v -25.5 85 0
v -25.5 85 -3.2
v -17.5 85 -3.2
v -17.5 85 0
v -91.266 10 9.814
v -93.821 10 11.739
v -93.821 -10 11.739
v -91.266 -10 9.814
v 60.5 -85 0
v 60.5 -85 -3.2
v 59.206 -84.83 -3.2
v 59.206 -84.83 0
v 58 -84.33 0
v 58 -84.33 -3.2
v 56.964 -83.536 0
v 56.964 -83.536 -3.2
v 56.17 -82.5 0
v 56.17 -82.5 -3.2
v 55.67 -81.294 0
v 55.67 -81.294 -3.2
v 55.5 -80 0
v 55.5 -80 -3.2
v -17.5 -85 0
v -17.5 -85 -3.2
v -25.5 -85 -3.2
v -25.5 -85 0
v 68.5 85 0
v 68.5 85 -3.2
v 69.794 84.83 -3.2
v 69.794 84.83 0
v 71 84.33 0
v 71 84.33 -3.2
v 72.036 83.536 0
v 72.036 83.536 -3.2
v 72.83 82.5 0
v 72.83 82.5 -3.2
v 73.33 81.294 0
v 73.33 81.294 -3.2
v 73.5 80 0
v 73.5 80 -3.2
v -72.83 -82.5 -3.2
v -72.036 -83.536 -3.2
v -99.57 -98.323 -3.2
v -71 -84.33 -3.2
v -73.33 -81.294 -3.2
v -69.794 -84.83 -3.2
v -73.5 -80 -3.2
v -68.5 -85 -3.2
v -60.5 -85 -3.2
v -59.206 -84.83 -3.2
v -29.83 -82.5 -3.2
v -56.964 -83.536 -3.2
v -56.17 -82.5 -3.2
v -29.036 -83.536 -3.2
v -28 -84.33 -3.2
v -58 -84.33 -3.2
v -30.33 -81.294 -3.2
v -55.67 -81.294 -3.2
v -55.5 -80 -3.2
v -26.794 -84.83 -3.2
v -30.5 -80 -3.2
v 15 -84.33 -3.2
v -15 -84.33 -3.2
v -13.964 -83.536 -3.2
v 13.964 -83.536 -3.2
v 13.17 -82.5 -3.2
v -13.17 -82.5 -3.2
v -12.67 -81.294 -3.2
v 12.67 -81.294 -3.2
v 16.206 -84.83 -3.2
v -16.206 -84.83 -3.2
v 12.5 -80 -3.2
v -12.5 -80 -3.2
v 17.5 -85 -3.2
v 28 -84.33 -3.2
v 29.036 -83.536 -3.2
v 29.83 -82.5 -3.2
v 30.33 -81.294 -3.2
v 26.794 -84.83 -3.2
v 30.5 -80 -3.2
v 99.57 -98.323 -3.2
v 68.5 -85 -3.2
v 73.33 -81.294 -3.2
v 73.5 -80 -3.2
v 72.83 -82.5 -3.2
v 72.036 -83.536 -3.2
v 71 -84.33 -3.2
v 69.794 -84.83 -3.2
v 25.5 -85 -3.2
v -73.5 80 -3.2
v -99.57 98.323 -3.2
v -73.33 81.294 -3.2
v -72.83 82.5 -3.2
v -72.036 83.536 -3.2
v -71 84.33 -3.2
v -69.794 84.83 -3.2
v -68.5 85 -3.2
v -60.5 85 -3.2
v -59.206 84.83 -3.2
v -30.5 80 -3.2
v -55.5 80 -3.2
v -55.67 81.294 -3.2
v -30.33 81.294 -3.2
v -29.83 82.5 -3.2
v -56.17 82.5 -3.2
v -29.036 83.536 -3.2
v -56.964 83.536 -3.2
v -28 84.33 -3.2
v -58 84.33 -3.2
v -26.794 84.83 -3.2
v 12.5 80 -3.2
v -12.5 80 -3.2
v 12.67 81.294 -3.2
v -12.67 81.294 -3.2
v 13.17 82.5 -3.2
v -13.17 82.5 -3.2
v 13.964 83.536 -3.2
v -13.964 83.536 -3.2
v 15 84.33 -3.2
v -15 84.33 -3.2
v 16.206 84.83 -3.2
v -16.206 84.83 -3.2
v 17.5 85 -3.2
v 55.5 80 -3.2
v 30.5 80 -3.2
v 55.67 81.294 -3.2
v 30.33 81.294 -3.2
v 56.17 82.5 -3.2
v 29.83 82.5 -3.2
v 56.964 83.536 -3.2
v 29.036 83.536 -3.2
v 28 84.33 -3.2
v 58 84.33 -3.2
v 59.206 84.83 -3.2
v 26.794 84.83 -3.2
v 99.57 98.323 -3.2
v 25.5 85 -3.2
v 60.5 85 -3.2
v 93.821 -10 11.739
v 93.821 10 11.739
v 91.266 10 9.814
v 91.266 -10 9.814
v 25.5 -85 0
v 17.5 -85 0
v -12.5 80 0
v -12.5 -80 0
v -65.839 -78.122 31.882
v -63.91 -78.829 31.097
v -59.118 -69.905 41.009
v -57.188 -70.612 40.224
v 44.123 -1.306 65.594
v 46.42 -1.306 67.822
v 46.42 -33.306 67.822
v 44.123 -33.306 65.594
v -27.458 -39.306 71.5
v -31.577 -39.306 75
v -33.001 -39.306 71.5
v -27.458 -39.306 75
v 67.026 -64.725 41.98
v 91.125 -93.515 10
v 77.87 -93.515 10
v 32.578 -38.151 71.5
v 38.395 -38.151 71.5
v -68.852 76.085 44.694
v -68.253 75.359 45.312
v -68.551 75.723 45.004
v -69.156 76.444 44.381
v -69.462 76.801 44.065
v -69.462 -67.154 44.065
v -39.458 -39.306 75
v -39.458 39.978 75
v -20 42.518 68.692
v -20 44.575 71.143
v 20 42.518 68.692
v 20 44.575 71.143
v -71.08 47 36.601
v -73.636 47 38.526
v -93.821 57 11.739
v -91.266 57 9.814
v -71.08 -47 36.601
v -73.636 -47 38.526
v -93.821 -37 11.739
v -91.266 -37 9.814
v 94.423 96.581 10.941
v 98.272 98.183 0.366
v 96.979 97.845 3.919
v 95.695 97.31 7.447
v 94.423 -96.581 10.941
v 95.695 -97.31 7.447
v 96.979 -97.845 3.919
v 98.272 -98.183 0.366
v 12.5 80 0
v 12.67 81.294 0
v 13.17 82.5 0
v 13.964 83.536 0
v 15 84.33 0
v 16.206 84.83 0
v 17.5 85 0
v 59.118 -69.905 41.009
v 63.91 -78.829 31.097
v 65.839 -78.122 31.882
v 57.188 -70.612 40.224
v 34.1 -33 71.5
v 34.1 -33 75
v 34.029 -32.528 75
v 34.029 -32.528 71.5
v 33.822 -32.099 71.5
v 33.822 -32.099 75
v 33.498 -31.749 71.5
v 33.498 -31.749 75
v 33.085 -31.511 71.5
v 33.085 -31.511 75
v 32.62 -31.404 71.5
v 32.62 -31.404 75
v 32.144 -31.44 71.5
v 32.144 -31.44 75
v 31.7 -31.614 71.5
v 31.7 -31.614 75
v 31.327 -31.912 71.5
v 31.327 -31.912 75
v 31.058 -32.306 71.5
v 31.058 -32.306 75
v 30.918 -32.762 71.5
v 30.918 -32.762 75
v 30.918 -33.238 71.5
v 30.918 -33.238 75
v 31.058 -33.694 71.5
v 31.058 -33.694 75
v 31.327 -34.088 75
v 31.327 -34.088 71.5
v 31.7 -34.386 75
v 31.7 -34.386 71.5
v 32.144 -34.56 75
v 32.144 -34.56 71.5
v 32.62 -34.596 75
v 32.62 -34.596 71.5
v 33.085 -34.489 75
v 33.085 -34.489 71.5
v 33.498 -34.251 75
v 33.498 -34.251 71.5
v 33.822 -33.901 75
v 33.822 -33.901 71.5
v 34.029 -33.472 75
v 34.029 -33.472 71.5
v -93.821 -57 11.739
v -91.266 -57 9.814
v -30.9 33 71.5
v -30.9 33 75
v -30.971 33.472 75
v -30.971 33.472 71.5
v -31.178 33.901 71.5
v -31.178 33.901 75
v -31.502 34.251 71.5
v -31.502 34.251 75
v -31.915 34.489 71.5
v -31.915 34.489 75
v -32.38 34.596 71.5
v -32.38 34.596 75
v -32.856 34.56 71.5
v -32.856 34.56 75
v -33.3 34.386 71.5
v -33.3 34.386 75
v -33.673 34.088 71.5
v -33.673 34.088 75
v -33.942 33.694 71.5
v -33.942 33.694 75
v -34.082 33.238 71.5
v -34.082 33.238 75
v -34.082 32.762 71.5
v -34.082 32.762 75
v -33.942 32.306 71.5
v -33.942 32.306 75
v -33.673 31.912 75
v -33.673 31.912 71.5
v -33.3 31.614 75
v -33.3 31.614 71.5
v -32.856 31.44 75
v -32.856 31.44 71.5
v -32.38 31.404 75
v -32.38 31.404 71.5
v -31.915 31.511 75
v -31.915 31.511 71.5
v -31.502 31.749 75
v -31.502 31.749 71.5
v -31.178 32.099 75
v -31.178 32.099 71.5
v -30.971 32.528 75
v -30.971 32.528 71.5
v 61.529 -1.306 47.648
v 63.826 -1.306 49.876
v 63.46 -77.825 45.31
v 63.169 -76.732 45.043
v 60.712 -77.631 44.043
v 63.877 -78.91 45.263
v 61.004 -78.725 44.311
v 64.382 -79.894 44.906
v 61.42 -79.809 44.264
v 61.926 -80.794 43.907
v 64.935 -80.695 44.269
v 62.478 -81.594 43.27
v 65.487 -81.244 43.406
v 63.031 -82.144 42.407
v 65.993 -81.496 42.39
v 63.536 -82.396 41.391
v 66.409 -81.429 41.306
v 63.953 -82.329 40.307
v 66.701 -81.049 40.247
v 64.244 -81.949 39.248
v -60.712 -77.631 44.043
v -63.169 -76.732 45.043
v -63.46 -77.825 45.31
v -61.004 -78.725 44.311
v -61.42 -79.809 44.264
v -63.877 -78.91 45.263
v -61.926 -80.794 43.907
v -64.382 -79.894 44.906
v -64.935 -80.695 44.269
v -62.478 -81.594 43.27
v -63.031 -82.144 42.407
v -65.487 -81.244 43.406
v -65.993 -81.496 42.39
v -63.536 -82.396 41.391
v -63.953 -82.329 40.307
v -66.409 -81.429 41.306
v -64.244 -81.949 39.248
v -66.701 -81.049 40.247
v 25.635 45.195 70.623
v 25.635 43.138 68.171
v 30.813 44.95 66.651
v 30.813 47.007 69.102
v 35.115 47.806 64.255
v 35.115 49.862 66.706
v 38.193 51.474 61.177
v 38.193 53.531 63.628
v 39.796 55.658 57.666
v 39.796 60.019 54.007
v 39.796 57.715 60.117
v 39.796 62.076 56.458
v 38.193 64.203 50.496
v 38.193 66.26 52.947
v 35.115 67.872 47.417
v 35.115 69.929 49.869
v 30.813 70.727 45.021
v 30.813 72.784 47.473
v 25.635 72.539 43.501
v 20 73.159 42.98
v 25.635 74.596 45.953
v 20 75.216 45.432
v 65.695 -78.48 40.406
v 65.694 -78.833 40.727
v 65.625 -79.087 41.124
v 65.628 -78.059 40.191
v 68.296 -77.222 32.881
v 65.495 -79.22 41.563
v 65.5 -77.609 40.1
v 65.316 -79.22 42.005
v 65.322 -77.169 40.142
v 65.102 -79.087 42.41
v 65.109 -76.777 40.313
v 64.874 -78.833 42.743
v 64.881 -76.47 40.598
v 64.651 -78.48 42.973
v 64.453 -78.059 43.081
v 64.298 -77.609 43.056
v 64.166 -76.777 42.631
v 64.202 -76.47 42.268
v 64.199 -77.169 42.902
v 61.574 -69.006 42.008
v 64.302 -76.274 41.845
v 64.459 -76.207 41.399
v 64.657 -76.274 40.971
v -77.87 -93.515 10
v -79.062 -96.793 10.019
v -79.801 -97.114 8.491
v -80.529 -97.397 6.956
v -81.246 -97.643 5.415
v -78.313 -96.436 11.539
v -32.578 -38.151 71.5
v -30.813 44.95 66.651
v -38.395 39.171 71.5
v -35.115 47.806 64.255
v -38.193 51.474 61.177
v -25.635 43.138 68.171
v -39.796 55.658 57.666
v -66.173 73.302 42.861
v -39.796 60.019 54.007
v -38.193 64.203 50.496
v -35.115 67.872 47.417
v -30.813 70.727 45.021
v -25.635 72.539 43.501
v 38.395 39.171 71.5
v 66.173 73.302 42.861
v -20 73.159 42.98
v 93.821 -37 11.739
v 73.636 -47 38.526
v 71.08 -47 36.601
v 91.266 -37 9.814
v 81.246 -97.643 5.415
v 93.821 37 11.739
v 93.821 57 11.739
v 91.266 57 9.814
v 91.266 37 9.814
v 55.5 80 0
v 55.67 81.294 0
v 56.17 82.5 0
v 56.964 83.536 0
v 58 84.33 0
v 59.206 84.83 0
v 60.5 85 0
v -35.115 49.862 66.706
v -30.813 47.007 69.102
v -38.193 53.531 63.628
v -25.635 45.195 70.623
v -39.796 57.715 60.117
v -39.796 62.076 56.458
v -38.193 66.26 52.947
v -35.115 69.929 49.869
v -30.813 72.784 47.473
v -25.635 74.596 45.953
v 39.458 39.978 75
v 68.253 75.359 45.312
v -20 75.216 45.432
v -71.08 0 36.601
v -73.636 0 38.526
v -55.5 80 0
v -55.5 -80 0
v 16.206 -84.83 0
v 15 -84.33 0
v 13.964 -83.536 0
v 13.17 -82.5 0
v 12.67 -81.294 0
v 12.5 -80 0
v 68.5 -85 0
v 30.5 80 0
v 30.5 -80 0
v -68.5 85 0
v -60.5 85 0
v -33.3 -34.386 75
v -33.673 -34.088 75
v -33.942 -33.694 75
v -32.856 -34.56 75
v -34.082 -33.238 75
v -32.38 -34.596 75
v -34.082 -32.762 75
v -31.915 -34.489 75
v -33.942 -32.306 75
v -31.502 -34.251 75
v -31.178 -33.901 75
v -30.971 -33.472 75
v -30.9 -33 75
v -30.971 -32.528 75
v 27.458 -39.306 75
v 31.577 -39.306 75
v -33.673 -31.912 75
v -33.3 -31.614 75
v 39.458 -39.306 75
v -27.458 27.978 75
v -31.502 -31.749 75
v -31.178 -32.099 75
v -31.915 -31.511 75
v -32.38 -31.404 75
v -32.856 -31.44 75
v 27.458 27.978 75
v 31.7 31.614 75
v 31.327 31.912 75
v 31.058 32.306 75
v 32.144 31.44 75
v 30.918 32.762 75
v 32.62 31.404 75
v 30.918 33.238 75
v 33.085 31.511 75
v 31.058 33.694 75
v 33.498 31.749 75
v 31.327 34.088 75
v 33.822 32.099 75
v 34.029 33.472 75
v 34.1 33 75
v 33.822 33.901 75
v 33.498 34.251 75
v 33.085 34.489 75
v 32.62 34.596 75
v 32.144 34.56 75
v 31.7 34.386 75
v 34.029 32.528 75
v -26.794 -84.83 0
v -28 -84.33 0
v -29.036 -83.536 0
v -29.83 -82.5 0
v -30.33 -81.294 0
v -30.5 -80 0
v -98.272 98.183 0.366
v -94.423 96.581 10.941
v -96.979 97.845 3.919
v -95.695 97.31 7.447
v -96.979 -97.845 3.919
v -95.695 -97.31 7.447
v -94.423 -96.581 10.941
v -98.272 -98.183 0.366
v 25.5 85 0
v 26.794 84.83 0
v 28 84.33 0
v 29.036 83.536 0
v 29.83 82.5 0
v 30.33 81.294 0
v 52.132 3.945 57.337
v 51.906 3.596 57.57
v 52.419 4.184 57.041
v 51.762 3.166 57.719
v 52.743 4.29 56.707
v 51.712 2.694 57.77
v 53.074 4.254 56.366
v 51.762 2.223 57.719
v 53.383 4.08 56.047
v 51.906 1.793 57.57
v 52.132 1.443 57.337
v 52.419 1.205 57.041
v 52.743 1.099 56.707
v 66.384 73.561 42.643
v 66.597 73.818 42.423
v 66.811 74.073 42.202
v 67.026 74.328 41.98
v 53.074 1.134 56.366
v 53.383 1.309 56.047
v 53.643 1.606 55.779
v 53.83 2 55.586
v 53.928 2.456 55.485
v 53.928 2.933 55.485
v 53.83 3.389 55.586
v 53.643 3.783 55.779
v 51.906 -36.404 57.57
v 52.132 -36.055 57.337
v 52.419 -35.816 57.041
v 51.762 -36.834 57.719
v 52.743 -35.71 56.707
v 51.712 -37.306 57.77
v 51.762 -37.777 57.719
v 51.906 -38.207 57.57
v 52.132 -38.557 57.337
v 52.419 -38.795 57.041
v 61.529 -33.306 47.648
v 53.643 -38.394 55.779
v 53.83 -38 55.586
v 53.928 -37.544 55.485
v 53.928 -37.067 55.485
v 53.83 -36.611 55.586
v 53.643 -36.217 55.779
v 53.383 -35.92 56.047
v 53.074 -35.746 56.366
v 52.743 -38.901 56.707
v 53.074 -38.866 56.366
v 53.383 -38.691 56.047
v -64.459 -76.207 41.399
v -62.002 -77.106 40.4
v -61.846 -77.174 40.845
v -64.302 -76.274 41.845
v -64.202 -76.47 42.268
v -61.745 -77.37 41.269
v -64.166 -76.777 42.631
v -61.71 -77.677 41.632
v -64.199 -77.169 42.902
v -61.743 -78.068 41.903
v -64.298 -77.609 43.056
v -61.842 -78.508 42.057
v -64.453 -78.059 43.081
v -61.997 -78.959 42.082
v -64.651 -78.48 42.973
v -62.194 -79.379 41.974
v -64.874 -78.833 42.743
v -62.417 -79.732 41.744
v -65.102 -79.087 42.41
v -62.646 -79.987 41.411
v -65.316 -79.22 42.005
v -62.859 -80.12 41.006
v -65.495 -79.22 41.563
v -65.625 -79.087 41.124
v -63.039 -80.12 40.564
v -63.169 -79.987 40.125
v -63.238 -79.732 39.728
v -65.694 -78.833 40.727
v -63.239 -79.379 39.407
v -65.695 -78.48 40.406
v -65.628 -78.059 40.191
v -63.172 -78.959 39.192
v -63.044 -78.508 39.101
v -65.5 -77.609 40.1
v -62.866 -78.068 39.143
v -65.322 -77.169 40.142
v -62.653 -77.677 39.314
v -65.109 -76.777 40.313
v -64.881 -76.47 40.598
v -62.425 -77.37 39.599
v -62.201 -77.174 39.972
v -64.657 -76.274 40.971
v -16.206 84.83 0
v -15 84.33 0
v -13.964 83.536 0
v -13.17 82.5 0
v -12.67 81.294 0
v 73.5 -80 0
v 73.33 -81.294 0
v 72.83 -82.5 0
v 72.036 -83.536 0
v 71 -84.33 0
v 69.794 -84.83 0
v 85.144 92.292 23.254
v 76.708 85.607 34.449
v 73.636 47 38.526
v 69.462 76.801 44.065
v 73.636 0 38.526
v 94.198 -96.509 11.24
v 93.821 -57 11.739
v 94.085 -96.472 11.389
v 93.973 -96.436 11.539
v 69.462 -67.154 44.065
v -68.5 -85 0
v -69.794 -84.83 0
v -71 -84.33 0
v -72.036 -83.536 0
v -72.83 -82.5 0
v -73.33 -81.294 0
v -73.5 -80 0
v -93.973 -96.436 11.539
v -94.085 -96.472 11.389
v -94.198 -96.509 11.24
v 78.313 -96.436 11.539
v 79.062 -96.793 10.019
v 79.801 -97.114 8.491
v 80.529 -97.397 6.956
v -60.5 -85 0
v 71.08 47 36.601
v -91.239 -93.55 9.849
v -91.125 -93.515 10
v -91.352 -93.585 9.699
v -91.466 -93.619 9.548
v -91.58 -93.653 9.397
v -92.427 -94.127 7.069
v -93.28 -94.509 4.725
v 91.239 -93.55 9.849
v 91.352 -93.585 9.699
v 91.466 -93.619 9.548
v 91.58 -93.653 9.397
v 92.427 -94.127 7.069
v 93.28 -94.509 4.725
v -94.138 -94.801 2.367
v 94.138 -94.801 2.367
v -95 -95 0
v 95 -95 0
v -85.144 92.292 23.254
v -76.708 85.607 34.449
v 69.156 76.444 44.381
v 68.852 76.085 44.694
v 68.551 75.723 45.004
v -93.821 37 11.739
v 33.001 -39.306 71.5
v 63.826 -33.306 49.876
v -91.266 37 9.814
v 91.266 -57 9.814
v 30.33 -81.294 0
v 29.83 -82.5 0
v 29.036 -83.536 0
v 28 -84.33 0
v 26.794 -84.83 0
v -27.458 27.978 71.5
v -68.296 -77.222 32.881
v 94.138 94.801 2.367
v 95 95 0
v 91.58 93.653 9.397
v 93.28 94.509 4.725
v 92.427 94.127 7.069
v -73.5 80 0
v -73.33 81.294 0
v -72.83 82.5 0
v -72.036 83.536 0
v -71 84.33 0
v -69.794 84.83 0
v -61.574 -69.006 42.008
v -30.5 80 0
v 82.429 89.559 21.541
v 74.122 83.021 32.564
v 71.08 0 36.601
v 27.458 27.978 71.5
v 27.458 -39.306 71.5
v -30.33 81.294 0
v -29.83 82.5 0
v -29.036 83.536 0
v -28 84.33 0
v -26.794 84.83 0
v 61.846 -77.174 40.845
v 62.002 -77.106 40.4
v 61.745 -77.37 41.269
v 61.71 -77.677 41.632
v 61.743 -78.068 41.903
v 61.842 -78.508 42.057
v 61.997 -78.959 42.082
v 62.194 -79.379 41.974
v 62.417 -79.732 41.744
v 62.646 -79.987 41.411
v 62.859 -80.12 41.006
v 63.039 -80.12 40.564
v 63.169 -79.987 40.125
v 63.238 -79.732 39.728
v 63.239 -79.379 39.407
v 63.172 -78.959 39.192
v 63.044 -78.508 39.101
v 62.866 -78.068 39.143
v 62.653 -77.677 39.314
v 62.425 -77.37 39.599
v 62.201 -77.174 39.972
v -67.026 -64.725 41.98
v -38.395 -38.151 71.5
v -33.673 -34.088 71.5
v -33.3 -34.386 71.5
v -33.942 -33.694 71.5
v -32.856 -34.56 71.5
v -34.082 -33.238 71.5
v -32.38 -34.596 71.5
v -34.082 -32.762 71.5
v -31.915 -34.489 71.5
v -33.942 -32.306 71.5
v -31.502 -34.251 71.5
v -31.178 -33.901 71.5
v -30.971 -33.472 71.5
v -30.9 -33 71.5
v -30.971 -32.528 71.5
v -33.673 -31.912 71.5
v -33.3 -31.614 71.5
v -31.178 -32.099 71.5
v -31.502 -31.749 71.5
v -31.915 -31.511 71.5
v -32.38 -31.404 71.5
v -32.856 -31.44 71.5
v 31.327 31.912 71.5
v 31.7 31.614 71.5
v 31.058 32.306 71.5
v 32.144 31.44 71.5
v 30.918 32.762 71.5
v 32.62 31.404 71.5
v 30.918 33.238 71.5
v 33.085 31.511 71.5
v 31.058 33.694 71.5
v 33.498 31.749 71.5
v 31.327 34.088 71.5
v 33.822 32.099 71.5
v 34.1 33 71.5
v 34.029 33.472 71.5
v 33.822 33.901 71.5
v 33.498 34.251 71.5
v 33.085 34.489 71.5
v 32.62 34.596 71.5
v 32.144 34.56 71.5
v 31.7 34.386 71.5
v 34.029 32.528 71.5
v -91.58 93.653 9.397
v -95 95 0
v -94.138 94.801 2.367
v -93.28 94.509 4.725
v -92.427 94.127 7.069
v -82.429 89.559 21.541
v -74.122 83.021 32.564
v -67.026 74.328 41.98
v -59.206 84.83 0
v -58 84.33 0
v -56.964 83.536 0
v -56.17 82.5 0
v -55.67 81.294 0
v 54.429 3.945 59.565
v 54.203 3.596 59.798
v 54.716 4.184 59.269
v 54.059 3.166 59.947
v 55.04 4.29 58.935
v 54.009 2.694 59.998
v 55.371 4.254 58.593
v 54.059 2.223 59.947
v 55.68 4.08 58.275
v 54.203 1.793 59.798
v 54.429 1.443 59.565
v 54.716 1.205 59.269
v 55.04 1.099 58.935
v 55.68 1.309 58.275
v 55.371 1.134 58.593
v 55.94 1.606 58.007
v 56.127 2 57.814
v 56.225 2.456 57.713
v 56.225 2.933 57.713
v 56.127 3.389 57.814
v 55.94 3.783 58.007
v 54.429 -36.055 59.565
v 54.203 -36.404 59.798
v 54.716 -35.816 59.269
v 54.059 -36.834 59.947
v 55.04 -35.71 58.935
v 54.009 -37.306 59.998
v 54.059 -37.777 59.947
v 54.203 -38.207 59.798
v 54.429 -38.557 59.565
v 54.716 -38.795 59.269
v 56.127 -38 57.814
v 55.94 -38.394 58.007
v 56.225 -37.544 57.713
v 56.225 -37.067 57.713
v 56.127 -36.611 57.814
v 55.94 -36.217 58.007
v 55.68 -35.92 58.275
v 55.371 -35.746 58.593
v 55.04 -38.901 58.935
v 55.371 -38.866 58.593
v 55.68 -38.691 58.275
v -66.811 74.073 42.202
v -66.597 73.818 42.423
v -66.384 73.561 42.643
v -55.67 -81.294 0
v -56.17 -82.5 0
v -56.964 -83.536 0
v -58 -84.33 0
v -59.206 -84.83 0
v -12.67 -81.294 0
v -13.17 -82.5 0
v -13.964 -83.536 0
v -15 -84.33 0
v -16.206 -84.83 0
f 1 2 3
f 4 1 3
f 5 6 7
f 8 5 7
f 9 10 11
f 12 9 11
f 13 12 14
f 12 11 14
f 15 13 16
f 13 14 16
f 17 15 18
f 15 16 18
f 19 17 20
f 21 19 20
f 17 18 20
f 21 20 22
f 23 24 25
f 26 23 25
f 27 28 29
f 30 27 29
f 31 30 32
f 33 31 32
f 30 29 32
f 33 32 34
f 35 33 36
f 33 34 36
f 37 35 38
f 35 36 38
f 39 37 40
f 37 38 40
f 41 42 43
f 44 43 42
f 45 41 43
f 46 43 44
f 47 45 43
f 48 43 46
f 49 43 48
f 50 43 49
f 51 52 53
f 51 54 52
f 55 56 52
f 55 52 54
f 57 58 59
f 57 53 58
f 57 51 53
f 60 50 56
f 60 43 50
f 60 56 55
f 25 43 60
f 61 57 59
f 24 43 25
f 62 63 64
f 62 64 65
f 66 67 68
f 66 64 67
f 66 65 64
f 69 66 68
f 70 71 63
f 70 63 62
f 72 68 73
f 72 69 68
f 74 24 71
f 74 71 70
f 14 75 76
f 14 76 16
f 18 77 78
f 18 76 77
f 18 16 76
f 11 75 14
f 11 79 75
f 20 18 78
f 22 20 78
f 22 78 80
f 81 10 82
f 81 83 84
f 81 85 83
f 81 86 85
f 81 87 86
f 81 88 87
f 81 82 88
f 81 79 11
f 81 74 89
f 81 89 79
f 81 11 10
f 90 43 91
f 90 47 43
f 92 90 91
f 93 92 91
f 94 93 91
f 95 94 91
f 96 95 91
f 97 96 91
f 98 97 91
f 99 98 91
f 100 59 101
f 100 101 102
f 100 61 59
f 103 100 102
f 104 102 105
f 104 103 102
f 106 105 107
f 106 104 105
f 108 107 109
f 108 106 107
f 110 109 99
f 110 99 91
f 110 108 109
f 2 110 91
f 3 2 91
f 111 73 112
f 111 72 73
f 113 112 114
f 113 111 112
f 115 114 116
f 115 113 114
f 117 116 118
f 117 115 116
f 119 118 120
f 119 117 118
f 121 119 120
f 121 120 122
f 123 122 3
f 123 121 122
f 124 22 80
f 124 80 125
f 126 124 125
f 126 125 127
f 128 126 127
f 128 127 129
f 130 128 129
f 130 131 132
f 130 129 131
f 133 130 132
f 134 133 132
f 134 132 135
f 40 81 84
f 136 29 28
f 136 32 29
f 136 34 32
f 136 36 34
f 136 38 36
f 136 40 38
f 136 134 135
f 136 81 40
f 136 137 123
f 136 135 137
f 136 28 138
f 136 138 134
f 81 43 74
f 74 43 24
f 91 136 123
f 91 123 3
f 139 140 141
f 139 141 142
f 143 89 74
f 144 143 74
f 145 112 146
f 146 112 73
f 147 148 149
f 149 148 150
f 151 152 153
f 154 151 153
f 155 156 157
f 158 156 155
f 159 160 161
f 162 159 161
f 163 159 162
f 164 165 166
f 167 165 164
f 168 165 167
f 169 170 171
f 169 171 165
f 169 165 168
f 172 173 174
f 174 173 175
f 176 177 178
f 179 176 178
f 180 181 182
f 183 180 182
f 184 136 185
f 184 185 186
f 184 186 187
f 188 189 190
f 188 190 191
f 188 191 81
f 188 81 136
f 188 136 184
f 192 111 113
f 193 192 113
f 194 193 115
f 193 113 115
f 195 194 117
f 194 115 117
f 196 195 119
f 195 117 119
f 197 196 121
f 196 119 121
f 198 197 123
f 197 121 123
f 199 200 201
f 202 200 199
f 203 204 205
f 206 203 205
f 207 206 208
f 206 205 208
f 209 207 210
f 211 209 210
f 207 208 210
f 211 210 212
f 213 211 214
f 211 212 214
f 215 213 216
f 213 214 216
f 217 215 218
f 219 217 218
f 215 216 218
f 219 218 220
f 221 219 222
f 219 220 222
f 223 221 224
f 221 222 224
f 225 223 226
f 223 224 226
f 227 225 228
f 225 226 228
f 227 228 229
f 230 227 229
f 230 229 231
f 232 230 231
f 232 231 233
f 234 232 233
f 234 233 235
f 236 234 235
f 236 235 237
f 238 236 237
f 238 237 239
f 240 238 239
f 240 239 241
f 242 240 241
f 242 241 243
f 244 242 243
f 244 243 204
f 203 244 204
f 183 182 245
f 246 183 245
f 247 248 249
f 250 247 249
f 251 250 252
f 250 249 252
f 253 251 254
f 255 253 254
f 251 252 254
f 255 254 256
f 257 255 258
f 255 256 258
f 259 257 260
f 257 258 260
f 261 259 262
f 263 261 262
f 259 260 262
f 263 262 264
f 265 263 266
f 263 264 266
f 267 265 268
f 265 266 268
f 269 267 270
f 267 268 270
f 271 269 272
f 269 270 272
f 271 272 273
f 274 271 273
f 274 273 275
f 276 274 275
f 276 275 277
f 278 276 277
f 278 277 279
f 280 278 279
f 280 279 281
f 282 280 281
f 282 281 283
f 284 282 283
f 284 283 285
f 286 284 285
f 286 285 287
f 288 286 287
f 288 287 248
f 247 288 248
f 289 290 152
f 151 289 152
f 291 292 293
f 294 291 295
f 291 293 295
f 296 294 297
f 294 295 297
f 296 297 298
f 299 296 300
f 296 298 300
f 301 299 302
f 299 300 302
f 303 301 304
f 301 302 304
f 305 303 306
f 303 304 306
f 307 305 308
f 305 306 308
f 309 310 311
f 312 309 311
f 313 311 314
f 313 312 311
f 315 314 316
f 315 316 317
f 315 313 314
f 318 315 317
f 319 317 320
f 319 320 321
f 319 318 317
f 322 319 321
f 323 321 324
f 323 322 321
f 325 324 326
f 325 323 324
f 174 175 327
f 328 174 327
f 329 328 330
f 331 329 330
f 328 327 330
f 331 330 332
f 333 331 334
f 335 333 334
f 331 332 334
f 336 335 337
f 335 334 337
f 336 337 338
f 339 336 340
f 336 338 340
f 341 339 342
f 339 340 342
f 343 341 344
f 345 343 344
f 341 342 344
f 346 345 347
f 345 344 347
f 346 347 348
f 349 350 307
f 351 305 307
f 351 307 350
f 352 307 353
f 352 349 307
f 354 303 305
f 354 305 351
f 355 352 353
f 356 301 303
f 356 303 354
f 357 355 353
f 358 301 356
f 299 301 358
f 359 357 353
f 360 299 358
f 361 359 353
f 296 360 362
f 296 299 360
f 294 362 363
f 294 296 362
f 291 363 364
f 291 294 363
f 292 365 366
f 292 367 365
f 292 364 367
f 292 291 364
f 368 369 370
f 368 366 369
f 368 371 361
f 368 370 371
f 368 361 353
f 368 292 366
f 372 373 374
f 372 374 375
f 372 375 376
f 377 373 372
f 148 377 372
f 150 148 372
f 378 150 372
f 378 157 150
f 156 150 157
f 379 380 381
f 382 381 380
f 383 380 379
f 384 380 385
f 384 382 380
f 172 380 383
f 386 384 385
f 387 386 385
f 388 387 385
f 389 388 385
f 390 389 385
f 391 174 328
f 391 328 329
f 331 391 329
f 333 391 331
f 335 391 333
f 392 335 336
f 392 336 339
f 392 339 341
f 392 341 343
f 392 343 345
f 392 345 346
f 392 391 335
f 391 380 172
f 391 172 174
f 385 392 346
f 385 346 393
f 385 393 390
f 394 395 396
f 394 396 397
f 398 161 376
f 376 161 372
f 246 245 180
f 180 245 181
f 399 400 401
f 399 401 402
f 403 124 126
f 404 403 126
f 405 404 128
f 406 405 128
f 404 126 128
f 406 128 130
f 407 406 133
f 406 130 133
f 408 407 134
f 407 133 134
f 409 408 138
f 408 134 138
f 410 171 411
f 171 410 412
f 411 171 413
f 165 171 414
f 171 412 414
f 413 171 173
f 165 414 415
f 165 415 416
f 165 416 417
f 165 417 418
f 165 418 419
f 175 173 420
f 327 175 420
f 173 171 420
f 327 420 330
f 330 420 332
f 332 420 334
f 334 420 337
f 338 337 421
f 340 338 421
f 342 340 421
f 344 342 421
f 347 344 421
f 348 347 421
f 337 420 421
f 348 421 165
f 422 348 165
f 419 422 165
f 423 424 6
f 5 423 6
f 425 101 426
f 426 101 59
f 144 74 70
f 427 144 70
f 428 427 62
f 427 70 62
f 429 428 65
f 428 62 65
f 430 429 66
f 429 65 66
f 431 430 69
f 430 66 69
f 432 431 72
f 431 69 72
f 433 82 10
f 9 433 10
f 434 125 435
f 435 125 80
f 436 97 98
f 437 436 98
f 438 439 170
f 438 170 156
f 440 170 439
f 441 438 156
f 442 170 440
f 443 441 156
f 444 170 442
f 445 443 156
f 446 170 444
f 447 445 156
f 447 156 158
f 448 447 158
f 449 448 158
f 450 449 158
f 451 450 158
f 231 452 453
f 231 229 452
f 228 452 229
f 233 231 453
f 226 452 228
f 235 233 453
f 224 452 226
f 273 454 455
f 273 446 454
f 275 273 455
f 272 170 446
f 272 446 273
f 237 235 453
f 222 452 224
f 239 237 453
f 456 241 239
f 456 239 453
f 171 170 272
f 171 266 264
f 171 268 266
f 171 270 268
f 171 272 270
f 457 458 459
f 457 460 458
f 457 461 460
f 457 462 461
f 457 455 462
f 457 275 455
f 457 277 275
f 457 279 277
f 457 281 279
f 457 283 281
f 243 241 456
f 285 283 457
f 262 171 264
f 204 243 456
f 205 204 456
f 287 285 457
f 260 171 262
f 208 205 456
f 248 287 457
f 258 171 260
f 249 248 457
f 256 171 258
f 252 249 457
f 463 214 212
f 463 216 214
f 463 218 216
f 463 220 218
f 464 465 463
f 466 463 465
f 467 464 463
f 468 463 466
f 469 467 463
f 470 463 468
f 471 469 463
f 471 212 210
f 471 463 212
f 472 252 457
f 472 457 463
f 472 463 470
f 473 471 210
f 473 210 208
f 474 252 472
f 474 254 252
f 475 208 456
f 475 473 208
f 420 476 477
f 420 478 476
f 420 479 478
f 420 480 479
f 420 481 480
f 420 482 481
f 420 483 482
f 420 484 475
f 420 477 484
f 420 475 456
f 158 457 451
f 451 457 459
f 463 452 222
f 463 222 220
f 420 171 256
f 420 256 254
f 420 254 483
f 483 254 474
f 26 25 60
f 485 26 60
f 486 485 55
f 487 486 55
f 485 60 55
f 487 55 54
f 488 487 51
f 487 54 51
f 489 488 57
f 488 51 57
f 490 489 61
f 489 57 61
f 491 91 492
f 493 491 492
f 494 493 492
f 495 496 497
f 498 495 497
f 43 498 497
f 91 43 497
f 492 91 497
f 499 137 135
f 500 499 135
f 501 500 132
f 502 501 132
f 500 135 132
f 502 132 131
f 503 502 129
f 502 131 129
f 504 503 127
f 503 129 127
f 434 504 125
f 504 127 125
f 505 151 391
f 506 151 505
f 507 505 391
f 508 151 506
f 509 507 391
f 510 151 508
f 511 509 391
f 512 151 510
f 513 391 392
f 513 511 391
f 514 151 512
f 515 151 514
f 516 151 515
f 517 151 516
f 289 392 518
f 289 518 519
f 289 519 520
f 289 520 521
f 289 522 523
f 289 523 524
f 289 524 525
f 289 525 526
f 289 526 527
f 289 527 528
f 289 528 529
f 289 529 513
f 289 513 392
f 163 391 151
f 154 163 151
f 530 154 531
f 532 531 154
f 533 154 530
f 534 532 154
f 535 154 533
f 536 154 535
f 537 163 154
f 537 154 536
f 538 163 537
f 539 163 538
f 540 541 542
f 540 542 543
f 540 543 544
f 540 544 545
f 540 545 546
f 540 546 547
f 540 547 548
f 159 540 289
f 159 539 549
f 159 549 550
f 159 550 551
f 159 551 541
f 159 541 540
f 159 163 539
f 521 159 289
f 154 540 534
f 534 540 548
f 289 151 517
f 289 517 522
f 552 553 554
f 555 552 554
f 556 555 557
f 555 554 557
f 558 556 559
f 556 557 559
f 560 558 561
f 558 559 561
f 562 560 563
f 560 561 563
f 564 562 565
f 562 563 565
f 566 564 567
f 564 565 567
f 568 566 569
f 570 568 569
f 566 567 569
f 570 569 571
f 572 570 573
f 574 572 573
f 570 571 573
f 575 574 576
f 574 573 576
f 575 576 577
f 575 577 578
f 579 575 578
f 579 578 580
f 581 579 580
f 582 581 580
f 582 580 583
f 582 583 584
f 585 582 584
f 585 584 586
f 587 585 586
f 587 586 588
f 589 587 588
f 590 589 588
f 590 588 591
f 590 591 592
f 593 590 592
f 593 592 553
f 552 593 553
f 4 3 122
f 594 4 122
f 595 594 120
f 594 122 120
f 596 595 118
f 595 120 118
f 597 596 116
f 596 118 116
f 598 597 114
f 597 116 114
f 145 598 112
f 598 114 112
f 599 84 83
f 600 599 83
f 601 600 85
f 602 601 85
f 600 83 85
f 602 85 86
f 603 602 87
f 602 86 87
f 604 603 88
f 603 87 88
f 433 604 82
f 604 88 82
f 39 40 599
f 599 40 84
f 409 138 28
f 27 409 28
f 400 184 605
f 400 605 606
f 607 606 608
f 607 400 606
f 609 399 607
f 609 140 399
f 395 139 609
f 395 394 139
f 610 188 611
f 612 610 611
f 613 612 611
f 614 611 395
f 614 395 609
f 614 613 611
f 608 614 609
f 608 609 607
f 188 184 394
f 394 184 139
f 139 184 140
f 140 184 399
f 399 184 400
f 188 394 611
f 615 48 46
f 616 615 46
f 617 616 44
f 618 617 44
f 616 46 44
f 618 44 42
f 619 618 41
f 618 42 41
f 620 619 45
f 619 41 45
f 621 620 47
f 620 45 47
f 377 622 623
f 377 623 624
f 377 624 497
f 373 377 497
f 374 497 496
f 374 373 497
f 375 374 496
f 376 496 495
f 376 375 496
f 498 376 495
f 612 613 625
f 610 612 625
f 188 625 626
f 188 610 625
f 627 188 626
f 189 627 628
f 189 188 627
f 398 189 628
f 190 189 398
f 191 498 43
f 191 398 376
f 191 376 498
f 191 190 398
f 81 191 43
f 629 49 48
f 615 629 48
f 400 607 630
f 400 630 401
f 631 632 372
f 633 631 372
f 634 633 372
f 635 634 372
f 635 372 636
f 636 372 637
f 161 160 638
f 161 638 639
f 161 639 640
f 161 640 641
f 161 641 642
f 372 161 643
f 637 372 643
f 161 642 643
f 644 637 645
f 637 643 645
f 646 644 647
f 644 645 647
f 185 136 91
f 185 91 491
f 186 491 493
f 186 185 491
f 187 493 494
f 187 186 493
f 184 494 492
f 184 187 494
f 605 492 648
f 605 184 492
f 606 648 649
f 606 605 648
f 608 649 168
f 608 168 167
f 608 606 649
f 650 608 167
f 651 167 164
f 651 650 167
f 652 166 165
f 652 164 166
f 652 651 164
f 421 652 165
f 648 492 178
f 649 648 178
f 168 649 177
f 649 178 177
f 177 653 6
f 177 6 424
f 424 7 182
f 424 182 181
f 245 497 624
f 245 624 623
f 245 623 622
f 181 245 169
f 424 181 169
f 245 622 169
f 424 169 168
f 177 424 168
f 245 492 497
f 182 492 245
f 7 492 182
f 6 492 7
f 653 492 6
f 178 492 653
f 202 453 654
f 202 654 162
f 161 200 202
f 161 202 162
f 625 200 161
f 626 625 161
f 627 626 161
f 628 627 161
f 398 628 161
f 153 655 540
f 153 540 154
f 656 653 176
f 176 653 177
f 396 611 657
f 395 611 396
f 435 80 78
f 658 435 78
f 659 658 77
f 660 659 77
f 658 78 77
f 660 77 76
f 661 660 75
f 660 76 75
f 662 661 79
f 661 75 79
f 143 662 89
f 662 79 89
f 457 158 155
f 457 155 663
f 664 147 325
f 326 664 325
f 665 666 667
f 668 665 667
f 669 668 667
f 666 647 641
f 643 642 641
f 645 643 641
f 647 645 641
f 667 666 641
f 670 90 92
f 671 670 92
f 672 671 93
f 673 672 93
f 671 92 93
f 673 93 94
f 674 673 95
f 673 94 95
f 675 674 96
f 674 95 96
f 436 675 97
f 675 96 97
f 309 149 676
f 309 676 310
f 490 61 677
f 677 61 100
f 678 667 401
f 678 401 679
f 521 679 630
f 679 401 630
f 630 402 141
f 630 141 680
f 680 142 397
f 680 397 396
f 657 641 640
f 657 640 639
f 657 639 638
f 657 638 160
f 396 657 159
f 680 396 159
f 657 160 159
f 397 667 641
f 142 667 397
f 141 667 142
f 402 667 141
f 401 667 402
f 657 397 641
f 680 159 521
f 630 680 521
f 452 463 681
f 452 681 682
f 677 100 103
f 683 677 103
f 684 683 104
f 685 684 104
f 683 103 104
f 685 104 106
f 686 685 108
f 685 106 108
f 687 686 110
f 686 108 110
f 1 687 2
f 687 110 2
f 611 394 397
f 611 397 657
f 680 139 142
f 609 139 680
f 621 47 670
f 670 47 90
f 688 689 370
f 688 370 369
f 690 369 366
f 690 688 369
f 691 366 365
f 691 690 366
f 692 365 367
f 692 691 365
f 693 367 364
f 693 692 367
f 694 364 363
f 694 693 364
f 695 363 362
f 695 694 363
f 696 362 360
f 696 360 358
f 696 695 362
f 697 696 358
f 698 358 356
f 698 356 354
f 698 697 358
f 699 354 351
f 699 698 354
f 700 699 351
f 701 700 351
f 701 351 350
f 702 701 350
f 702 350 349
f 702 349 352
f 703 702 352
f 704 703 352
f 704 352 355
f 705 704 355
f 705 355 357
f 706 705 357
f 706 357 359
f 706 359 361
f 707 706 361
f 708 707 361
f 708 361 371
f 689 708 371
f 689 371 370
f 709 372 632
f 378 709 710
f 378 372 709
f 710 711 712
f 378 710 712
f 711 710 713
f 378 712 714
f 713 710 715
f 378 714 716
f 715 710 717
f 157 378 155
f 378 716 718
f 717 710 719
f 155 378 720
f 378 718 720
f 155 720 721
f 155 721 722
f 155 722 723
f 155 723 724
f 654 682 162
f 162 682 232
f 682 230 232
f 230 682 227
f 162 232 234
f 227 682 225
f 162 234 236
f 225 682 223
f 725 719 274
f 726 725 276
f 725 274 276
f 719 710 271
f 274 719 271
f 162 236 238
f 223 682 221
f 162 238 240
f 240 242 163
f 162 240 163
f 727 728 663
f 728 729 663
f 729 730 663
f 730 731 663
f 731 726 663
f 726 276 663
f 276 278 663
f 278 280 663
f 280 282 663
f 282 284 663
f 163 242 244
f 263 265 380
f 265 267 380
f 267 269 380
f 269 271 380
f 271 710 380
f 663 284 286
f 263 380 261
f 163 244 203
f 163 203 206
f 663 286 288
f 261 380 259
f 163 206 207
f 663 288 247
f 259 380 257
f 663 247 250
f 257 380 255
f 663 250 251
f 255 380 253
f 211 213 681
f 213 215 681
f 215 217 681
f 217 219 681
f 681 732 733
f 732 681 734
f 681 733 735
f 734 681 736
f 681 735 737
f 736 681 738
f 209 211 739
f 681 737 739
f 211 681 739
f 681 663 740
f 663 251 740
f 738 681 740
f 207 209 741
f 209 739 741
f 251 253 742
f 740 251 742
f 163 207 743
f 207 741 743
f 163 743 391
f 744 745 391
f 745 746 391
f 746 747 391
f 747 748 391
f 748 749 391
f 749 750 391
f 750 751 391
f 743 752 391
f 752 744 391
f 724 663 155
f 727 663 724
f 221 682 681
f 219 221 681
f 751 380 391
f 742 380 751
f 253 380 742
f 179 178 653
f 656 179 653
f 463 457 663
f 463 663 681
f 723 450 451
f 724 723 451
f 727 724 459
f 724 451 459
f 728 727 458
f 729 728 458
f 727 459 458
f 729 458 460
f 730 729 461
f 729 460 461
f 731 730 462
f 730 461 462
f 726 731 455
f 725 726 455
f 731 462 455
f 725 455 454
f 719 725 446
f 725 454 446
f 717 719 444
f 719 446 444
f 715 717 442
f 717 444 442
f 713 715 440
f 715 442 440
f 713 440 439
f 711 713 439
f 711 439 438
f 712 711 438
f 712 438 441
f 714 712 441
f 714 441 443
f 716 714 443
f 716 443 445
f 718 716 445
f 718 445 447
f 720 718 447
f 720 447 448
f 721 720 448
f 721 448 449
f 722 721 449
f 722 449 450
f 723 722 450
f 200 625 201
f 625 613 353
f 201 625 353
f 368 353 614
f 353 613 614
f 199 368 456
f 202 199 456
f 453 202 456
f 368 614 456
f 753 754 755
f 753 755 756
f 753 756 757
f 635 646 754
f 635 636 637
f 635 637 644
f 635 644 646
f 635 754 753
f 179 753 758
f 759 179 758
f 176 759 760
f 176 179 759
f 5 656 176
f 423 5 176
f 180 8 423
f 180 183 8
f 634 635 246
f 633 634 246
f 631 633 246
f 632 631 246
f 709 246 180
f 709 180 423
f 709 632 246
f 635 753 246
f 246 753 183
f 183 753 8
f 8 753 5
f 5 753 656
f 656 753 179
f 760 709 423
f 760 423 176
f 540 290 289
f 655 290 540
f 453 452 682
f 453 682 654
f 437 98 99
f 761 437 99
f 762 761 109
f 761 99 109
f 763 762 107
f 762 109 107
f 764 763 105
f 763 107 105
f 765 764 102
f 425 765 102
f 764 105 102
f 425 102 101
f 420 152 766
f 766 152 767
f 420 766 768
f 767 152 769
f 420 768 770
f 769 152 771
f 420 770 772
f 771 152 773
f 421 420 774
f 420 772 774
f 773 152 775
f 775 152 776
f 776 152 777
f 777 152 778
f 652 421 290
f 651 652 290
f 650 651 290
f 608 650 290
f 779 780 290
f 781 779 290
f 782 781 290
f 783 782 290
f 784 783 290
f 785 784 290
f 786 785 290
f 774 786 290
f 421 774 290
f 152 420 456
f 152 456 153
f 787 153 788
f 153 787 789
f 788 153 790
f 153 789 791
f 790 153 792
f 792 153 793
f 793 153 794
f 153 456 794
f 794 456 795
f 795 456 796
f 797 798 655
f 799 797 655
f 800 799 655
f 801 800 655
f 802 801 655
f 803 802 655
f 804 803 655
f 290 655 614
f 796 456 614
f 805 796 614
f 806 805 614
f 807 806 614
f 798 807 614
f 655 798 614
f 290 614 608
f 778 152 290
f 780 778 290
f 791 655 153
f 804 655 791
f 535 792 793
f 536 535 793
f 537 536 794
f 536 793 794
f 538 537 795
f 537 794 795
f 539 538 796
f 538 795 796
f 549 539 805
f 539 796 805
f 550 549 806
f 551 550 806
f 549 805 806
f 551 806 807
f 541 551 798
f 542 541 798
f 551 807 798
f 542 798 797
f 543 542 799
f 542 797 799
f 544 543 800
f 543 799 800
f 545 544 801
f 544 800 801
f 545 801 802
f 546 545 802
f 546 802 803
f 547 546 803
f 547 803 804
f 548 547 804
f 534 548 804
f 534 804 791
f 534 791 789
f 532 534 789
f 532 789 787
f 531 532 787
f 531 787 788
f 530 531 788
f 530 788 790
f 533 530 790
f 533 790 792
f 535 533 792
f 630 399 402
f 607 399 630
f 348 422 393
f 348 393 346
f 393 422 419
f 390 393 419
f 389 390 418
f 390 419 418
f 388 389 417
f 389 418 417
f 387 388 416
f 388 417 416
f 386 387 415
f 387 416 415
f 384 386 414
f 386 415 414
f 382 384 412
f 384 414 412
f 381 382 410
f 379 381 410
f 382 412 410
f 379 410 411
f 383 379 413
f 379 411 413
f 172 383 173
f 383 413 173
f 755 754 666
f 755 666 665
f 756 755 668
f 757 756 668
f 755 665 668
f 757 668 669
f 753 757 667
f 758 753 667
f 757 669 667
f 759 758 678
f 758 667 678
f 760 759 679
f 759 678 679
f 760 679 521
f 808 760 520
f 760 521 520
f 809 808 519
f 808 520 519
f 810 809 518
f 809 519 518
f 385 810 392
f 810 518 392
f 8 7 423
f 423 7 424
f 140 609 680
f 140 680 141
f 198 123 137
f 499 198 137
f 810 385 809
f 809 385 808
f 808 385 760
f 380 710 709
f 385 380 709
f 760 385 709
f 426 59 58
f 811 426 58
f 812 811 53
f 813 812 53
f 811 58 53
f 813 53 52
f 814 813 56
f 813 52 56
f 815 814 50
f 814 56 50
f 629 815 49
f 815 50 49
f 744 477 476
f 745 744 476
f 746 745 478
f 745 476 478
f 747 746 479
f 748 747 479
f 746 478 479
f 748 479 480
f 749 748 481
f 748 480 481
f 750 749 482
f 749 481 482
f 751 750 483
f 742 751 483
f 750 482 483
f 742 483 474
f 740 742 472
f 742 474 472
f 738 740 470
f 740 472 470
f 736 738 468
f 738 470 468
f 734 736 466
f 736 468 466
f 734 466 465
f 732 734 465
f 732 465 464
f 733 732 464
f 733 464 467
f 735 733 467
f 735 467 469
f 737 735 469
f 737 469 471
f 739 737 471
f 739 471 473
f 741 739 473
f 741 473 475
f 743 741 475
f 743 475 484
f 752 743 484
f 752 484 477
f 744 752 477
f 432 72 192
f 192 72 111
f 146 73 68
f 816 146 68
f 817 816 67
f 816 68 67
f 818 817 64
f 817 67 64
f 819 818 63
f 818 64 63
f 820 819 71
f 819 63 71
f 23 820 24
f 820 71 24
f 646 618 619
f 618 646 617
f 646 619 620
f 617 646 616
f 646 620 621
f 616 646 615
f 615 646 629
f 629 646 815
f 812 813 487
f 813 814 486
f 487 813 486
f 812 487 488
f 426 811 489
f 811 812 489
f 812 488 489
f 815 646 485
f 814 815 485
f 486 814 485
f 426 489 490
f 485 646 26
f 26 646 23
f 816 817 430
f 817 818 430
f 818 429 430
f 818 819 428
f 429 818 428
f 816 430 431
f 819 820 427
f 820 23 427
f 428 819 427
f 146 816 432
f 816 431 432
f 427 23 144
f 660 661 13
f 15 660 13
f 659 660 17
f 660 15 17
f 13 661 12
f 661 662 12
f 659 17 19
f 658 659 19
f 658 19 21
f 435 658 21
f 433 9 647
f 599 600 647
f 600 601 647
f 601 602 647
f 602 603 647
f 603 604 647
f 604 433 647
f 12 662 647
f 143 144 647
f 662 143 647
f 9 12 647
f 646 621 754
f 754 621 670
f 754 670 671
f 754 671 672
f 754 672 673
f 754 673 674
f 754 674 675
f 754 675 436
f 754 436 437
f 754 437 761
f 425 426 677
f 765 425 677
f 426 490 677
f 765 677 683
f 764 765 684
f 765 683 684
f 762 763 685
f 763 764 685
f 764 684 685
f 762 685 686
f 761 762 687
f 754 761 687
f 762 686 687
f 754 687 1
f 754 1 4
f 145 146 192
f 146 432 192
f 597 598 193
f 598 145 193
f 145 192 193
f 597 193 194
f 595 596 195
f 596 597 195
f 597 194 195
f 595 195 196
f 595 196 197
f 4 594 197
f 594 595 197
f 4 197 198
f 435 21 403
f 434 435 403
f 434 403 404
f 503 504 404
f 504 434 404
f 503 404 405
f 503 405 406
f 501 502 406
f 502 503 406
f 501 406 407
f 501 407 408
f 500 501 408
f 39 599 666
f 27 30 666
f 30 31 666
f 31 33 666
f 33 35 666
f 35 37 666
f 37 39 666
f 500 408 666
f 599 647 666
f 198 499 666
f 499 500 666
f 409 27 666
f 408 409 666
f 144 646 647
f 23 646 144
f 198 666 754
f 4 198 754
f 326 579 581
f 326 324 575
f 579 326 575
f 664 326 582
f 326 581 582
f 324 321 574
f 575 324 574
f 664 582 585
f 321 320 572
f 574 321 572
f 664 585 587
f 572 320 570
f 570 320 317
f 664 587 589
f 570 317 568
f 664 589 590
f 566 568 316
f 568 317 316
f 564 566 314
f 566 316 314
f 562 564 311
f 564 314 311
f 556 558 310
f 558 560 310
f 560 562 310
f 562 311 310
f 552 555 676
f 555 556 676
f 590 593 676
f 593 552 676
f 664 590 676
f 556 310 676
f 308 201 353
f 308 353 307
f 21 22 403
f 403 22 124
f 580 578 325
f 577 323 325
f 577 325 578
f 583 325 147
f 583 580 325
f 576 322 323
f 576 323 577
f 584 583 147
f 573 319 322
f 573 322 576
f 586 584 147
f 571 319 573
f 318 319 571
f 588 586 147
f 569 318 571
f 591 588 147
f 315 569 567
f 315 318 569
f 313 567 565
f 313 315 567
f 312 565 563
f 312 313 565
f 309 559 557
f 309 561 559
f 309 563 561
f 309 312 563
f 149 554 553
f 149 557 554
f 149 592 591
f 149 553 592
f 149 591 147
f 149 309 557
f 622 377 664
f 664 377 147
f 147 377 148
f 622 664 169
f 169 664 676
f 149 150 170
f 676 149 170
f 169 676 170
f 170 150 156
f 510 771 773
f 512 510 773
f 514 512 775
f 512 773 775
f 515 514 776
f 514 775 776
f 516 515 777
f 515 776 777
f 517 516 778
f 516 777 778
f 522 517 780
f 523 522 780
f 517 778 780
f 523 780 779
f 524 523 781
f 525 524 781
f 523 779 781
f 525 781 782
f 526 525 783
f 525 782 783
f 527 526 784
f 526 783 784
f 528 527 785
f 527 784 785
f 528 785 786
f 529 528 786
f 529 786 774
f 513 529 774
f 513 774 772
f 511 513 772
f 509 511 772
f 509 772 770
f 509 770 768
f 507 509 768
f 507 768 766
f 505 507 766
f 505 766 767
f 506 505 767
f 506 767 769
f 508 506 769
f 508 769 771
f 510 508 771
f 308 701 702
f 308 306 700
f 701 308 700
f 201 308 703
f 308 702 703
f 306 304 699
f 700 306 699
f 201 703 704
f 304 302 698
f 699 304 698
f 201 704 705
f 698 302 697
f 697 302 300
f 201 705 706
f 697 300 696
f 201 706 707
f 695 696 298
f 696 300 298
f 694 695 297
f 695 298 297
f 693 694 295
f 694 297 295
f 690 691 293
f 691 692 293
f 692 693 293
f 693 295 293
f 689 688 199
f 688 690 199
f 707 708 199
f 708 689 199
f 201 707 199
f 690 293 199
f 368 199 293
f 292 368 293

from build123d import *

# Parameters (mm, degrees)
PAD_DEPTH       = 100
POCKET_DEPTH    = 100
THICKNESS_T     = 3.2
POCKET001_DEPTH = 3.2
SKETCH005_R     = 1.6
SKETCH005_W     = 25
SKETCH005_H     = 32
POCKET002_DEPTH = 5
POCKET003_DEPTH = 5
PAD001_DEPTH    = 3.5
SKETCH008_R     = 1.6
POCKET004_DEPTH = 5
POCKET005_DEPTH = 5
POCKET006_DEPTH = 5
SKETCH011_R     = 1.6
PAD002_DEPTH    = 5
POCKET007_DEPTH = 2.2


with BuildPart() as part:
    # Sketch → Pad (new body, symmetric)
    with BuildSketch(Plane.YZ):
        with BuildLine():
            Line((-95, 0), (95, 0))
            ThreePointArc((95, 0), (88.5403047419, 23.6522969832), (73.3022221559, 42.8606195157))
            Line((35, 75), (73.3022221559, 42.8606195157))
            Line((-35, 75), (35, 75))
            Line((-93.5150551793, 10), (-35, 75))
            ThreePointArc((-93.5150551793, 10), (-94.4647133512, 5.0307659423), (-95, 0))
        make_face()
    extrude(amount=PAD_DEPTH, both=True)

    # Sketch001 → Pocket (cut, symmetric)
    with BuildSketch(Plane.XZ):
        with BuildLine():
            Line((-110, 0), (-110, 75))
            ThreePointArc((110, 75), (0, 106.1145618), (-110, 75))
            Line((110, 75), (110, 0))
            Line((110, 0), (95, 0))
            Line((95, 0), (91.5797985667, 9.3969262079))
            Line((91.5797985667, 9.3969262079), (67.0264978038, 41.980256839))
            Line((35, 75), (67.0264978038, 41.980256839))
            Line((-35, 75), (35, 75))
            Line((-35, 75), (-67.0264978038, 41.980256839))
            Line((-91.5797985667, 9.3969262079), (-67.0264978038, 41.980256839))
            Line((-95, 0), (-91.5797985667, 9.3969262079))
            Line((-110, 0), (-95, 0))
        make_face()
    extrude(amount=POCKET_DEPTH, both=True, mode=Mode.SUBTRACT)

    # Thickness
    thickness_openings = [part.faces().sort_by_distance(p)[0] for p in [
        (0, 0, 75),
    ]]
    offset(amount=THICKNESS_T, openings=thickness_openings, kind=Kind.INTERSECTION)

    # Sketch003 (on Face19 of Thickness) → Pocket001 (cut)
    with BuildSketch(Plane(origin=(0, -59.0046541218, 53.1178552581), x_dir=(1, 0, 0), z_dir=(0, -0.7432085454, 0.6690598314))):
        Polygon((-85, -68.162306919), (-30, 32.3235468044), (30, 32.3235468044), (85, -68.162306919), align=None)
    extrude(amount=-POCKET001_DEPTH, mode=Mode.SUBTRACT)

    # Sketch005 (on Face21 of Pocket001) → Pocket002 (cut)
    with BuildSketch(Plane(origin=(57.8138617322, 0, 56.074800666), x_dir=(-0.6962282131, 0, 0.7178205035), z_dir=(0.7178205035, 0, 0.6962282131))):
        with Locations((3.8648074159, 37.3056555523)):
            Circle(SKETCH005_R)
        with Locations((3.8648074159, -2.6943444477)):
            Circle(SKETCH005_R)
        with Locations((3.8648074159, 17.3056555523)):
            Rectangle(SKETCH005_W, SKETCH005_H)
    extrude(amount=-POCKET002_DEPTH, mode=Mode.SUBTRACT)

    # Sketch006 (on Face26 of Pocket002) → Pocket003 (cut)
    with BuildSketch(Plane(origin=(0, 53.4483679798, 63.6972845582), x_dir=(1, 0, 0), z_dir=(0, 0.6427876097, 0.7660444431))):
        with BuildLine():
            Line((-20, 28.416096279), (20, 28.416096279))
            ThreePointArc((20, -11.583903721), (40, 8.416096279), (20, 28.416096279))
            Line((-20, -11.583903721), (20, -11.583903721))
            ThreePointArc((-20, 28.416096279), (-40, 8.416096279), (-20, -11.583903721))
        make_face()
    extrude(amount=-POCKET003_DEPTH, mode=Mode.SUBTRACT)

    # Sketch007 (on Face13 of Pocket003) → Pad001 (join)
    with BuildSketch(Plane.XY.offset(75)):
        Polygon((-27.4579389755, -39.3056555523), (-27.4579389755, 27.978316246), (27.4579389755, 27.978316246), (27.4579389755, -39.3056555523), (39.4579389755, -39.3056555523), (39.4579389755, 39.978316246), (-39.4579389755, 39.978316246), (-39.4579389755, -39.3056555523), align=None)
    extrude(amount=-PAD001_DEPTH)

    # Sketch008 (on Face41 of Pad001) → Pocket004 (cut)
    with BuildSketch(Plane.XY.offset(75)):
        with Locations((-32.5, 33)):
            Circle(SKETCH008_R)
        with Locations((32.5, 33)):
            Circle(SKETCH008_R)
        with Locations((-32.5, -33)):
            Circle(SKETCH008_R)
        with Locations((32.5, -33)):
            Circle(SKETCH008_R)
    extrude(amount=-POCKET004_DEPTH, mode=Mode.SUBTRACT)

    # Sketch009 (on Face38 of Pocket004) → Pocket005 (cut)
    with BuildSketch(Plane(origin=(65.4833922887, 0, 49.3452754736), x_dir=(0, 1, 0), z_dir=(0.79863551, 0, 0.6018150232))):
        Polygon((-57, -47.0876228441), (-47, -13.5466031816), (-37, -47.0876228441), align=None)
        Polygon((-10, -47.0876228441), (0, -13.5466031816), (10, -47.0876228441), align=None)
        Polygon((37, -47.0876228441), (47, -13.5466031816), (57, -47.0876228441), align=None)
    pocket005 = extrude(amount=-POCKET005_DEPTH, mode=Mode.SUBTRACT)

    # Mirrored: Pocket005 across YZ
    add(pocket005.mirror(Plane.YZ), mode=Mode.SUBTRACT)

    # Sketch010 (on Face55 of Mirrored) → Pocket006 (cut)
    with BuildSketch(Plane(origin=(0, 0, -3.2), x_dir=(1, 0, 0), z_dir=(0, 0, -1))):
        with BuildLine():
            Line((-68.5, -85), (-60.5, -85))
            ThreePointArc((-60.5, -85), (-56.9644660941, -83.5355339059), (-55.5, -80))
            Line((-55.5, -80), (-55.5, 80))
            ThreePointArc((-55.5, 80), (-56.9644660941, 83.5355339059), (-60.5, 85))
            Line((-60.5, 85), (-68.5, 85))
            ThreePointArc((-68.5, 85), (-72.0355339059, 83.5355339059), (-73.5, 80))
            Line((-73.5, 80), (-73.5, -80))
            ThreePointArc((-73.5, -80), (-72.0355339059, -83.5355339059), (-68.5, -85))
        make_face()
        with BuildLine():
            Line((-25.5, -85), (-17.5, -85))
            ThreePointArc((-17.5, -85), (-13.9644660941, -83.5355339059), (-12.5, -80))
            Line((-12.5, -80), (-12.5, 80))
            ThreePointArc((-12.5, 80), (-13.9644660941, 83.5355339059), (-17.5, 85))
            Line((-17.5, 85), (-25.5, 85))
            ThreePointArc((-25.5, 85), (-29.0355339059, 83.5355339059), (-30.5, 80))
            Line((-30.5, 80), (-30.5, -80))
            ThreePointArc((-30.5, -80), (-29.0355339059, -83.5355339059), (-25.5, -85))
        make_face()
        with BuildLine():
            Line((17.5, -85), (25.5, -85))
            ThreePointArc((25.5, -85), (29.0355339059, -83.5355339059), (30.5, -80))
            Line((30.5, -80), (30.5, 80))
            ThreePointArc((30.5, 80), (29.0355339059, 83.5355339059), (25.5, 85))
            Line((25.5, 85), (17.5, 85))
            ThreePointArc((17.5, 85), (13.9644660941, 83.5355339059), (12.5, 80))
            Line((12.5, 80), (12.5, -80))
            ThreePointArc((12.5, -80), (13.9644660941, -83.5355339059), (17.5, -85))
        make_face()
        with BuildLine():
            Line((60.5, -85), (68.5, -85))
            ThreePointArc((68.5, -85), (72.0355339059, -83.5355339059), (73.5, -80))
            Line((73.5, -80), (73.5, 80))
            ThreePointArc((73.5, 80), (72.0355339059, 83.5355339059), (68.5, 85))
            Line((68.5, 85), (60.5, 85))
            ThreePointArc((60.5, 85), (56.9644660941, 83.5355339059), (55.5, 80))
            Line((55.5, 80), (55.5, -80))
            ThreePointArc((55.5, -80), (56.9644660941, -83.5355339059), (60.5, -85))
        make_face()
    extrude(amount=-POCKET006_DEPTH, mode=Mode.SUBTRACT)

    # Sketch011 (on Face64 of Pocket006) → Pad002 (join)
    with BuildSketch(Plane(origin=(-36.6979523749, 13.4389256858, 14.9282978013), x_dir=(0.2975562628, 0.9470000032, -0.1210424075), z_dir=(0.8771991015, -0.3212335505, -0.3568343346))):
        with BuildLine():
            Line((-97.4314518047, 4.7233611651), (-88.7550193505, 15.7106046714))
            Line((-88.7550193505, 15.7106046714), (-96.9132845396, 17.9202899666))
            ThreePointArc((-96.9132845396, 17.9202899666), (-101.098227275, 16.5383837063), (-101.4722817586, 12.1470861926))
            Line((-97.4314518047, 4.7233611651), (-101.4722817586, 12.1470861926))
        make_face()
        with Locations((-97.9590148447, 14.0594030051)):
            Circle(SKETCH011_R, mode=Mode.SUBTRACT)
    pad002 = extrude(amount=-PAD002_DEPTH)

    # Sketch011 (on Face64 of Pocket006) → Pocket007 (cut)
    with BuildSketch(Plane(origin=(-36.6979523749, 13.4389256858, 14.9282978013), x_dir=(0.2975562628, 0.9470000032, -0.1210424075), z_dir=(0.8771991015, -0.3212335505, -0.3568343346))):
        with BuildLine():
            Line((-97.4314518047, 4.7233611651), (-88.7550193505, 15.7106046714))
            Line((-88.7550193505, 15.7106046714), (-96.9132845396, 17.9202899666))
            ThreePointArc((-96.9132845396, 17.9202899666), (-101.098227275, 16.5383837063), (-101.4722817586, 12.1470861926))
            Line((-97.4314518047, 4.7233611651), (-101.4722817586, 12.1470861926))
        make_face()
        with Locations((-97.9590148447, 14.0594030051)):
            Circle(SKETCH011_R, mode=Mode.SUBTRACT)
    pocket007 = extrude(amount=-POCKET007_DEPTH, mode=Mode.SUBTRACT)

    # Mirrored001: Pad002 across YZ
    add(pad002.mirror(Plane.YZ))

    # Mirrored002: Pocket007 across YZ
    add(pocket007.mirror(Plane.YZ), mode=Mode.SUBTRACT)


solid = part.part
